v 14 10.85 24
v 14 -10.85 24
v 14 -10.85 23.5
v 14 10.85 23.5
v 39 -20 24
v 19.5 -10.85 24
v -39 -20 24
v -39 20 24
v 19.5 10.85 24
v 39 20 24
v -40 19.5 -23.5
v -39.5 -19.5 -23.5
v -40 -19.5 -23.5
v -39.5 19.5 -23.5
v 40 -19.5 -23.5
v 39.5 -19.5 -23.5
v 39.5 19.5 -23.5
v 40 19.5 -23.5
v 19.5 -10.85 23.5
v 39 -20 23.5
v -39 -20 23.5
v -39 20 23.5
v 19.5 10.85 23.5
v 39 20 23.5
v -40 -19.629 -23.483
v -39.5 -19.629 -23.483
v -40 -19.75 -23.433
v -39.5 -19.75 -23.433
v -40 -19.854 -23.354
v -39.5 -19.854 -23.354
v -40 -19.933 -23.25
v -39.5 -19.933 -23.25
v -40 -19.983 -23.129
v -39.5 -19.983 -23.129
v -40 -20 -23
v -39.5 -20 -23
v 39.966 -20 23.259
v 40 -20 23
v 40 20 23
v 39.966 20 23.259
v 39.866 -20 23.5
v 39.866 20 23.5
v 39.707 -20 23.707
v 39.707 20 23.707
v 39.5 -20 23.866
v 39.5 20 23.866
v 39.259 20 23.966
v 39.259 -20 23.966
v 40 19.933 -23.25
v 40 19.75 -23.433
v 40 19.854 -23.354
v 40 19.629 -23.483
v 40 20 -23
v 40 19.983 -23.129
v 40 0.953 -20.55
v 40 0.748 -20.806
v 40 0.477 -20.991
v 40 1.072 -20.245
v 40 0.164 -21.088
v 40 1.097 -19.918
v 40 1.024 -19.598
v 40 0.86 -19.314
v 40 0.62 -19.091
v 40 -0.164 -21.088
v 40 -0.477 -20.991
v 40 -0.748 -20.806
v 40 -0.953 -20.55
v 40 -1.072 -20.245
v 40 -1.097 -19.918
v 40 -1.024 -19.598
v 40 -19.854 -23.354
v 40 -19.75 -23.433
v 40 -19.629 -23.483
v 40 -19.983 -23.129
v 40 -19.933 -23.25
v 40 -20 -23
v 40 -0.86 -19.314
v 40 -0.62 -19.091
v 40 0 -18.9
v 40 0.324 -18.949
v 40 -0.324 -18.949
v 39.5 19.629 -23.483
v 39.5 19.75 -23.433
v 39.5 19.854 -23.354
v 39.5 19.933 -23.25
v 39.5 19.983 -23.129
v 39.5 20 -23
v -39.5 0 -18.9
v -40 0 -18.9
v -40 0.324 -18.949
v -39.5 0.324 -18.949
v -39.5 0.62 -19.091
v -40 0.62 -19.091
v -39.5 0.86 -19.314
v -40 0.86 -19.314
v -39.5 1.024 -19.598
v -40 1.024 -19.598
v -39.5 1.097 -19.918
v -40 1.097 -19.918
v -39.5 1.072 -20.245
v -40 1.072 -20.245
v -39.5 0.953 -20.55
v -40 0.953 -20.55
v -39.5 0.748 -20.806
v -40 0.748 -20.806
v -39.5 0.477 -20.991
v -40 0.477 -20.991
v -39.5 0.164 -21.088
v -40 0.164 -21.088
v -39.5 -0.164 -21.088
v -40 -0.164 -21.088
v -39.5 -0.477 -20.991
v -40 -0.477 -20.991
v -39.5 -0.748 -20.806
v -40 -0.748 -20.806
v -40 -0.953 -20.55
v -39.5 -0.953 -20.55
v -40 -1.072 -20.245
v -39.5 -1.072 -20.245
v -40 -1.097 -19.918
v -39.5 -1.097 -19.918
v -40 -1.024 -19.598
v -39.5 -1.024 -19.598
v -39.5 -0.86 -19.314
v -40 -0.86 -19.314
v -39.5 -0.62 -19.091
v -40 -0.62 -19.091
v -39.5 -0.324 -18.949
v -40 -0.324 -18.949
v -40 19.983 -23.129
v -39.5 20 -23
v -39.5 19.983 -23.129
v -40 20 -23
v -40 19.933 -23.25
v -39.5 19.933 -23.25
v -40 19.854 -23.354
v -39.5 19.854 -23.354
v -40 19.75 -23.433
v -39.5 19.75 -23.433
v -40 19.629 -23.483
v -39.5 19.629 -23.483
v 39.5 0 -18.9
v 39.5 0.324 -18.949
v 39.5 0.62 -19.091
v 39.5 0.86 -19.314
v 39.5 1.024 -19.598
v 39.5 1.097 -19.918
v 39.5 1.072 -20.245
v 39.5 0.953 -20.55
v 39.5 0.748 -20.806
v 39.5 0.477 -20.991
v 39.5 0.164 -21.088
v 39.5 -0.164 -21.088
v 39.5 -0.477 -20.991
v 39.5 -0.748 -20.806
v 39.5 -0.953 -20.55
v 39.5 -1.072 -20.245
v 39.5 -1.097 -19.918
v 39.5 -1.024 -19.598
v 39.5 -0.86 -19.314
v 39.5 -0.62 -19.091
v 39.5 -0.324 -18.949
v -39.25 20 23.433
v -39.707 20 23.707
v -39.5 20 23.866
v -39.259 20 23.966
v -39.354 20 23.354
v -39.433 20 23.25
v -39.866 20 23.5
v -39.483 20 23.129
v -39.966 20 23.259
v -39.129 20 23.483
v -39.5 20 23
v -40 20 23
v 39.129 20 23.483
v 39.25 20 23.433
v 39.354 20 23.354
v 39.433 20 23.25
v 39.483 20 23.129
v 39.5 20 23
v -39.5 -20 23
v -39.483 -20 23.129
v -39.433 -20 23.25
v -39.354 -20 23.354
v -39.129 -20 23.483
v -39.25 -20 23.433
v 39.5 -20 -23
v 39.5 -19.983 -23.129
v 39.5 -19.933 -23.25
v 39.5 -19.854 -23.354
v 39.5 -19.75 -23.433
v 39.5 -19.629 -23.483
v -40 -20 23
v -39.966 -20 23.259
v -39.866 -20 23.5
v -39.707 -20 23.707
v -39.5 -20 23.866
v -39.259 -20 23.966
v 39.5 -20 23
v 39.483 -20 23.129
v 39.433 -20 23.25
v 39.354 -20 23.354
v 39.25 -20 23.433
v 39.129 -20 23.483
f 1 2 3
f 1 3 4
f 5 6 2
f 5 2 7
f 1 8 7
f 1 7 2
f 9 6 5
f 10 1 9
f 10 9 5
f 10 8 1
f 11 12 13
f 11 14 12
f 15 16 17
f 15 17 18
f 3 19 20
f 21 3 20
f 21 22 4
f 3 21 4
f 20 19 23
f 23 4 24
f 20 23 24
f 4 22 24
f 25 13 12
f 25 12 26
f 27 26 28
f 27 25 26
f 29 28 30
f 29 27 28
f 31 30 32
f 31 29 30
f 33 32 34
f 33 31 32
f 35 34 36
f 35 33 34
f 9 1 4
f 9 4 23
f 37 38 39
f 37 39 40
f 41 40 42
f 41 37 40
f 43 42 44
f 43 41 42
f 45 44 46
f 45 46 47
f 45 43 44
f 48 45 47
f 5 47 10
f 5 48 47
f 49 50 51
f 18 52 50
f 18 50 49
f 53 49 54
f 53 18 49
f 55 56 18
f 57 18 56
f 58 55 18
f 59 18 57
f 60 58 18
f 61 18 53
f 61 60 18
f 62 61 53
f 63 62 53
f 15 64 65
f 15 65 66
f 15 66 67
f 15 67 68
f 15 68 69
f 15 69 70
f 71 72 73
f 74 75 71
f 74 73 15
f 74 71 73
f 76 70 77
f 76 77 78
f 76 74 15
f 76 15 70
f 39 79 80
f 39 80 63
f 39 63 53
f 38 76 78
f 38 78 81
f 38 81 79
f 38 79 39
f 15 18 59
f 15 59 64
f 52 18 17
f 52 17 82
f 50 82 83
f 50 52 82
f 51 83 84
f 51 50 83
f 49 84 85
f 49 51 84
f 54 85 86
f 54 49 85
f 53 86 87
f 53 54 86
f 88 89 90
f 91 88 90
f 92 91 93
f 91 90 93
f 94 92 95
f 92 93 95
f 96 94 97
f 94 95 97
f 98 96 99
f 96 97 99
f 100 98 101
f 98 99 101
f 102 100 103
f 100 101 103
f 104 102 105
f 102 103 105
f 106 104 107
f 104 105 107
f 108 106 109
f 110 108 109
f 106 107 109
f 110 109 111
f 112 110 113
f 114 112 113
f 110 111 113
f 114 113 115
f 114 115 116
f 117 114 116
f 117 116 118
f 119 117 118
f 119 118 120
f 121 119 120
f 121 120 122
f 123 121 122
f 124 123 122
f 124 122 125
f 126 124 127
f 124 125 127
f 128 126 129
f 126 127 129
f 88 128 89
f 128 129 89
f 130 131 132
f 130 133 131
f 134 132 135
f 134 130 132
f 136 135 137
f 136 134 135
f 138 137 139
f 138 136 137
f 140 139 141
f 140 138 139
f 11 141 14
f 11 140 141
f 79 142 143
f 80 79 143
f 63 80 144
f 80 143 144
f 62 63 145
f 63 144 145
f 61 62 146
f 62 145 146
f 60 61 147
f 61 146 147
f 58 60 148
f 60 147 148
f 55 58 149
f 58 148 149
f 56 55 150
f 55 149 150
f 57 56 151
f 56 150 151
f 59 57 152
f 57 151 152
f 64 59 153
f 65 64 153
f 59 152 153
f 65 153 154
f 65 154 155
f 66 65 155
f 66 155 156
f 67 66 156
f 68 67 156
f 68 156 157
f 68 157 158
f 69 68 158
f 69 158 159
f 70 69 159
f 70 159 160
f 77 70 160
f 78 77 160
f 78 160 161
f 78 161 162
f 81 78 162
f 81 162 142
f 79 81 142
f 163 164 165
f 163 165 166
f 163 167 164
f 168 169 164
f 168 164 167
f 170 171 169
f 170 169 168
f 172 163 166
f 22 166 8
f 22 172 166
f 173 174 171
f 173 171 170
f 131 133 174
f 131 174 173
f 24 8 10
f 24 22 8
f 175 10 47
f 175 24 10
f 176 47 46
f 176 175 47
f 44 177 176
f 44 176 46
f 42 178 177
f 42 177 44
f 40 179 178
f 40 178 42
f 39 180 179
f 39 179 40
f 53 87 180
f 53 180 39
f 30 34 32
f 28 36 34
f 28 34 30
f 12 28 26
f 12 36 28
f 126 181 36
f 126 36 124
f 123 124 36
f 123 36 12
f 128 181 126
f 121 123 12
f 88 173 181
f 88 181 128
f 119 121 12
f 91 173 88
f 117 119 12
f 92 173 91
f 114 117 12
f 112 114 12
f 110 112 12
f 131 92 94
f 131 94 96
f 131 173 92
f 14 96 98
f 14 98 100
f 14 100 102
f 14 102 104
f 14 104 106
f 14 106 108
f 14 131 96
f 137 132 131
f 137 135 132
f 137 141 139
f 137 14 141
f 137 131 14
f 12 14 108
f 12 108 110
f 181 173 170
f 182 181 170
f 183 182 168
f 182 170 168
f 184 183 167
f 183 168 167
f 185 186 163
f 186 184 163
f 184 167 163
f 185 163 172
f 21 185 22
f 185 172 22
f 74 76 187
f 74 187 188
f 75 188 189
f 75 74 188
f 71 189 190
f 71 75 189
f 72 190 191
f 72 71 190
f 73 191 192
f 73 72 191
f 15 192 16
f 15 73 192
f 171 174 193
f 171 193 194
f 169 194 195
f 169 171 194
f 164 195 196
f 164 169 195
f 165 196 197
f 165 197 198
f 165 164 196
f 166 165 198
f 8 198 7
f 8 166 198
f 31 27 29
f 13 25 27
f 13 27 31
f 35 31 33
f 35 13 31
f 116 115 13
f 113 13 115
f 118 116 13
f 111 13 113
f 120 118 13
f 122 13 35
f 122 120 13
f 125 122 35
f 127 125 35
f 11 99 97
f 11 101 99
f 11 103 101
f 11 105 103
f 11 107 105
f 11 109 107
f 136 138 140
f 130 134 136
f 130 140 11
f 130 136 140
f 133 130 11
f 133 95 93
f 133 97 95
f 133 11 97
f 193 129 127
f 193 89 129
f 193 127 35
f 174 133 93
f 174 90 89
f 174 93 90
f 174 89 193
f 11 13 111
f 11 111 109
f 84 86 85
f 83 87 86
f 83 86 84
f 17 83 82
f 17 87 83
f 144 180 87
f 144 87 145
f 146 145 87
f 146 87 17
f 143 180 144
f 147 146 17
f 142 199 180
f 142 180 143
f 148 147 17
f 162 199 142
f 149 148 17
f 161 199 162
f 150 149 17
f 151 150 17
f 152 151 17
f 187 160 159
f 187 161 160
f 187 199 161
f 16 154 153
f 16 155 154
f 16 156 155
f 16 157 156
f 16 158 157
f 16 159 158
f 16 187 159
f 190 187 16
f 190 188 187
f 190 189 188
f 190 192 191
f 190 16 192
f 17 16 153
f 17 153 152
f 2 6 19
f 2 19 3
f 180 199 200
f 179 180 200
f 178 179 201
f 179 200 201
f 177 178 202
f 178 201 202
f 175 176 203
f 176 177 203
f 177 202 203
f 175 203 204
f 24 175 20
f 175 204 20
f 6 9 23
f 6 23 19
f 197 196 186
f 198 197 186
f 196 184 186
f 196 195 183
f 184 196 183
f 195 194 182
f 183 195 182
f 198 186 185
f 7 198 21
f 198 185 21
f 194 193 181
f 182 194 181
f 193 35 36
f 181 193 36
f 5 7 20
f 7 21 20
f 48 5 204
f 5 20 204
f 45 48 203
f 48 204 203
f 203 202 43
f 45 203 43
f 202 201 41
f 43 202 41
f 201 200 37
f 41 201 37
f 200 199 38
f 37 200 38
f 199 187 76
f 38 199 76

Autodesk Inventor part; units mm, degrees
ref_plane "YZ Plane" through (0, 0, 0) normal (1, 0, 0) x (0, 1, 0)
ref_plane "XZ Plane" through (0, 0, 0) normal (0, 1, 0) x (-1, 0, 0)
ref_plane "РабПлоскость1" through (0, 0, 24) normal (0, 0, 1) x (1, 0, 0)
sketch "Эскиз1" plane through (0, 0, 24) normal (0, 0, 1) x (1, 0, 0)
  line L0 (-40, 20) -> (40, 20)
  line L1 (40, 20) -> (40, -20)
  line L2 (40, -20) -> (-40, -20)
  line L3 (-40, -20) -> (-40, 20)
  line L4 (-40, 20) -> (40, -20) construction
  line L5 (40, 20) -> (-40, -20) construction
  point P0 (0, 0)
  dimension "d1" = 80
  dimension "d2" = 40
extrude "Пластина1" add sketch "Эскиз1" against normal blind 0.5
sketch "Эскиз2" plane through (-39.5, 20, 24) normal (-1, 0, 0) x (0, -1, 0)
  line L0 (40, 0) -> (0, 0)
  line L1 (0, 0) -> (0, -47.5)
  line L2 (0, -47.5) -> (40, -47.5)
  line L3 (40, -47.5) -> (40, 0)
edge flange "Фланец1" height 47.5 angle 90 thickness 0.5 bend radius 0.5 thickness toward (-1, 0, 0) relief tear relief width 0.5 relief depth 0.25 corner gap 0.5 corner form 0 edges at (-40, 0, 23.5) (40, 0, 23.5) wall of the first edge with corners at (-39.5, -20, 24) (-39.5, 20, 24) (-39.5, 20, -23.5) (-39.5, -20, -23.5)
bend "Сгиб1"
corner "УглСтык1"
sketch "Эскиз3" plane through (0, 0, 24) normal (0, 0, 1) x (1, 0, 0)
  line L0 (19.5, -10.85) -> (14, -10.85)
  line L1 (14, -10.85) -> (14, 10.85)
  line L2 (14, 10.85) -> (19.5, 10.85)
  line L3 (19.5, 10.85) -> (19.5, -10.85)
  line L4 (19.5, -10.85) -> (14, 10.85) construction
  line L5 (14, -10.85) -> (19.5, 10.85) construction
  line L6 (14.5, -10.5) -> (18.5, -10.5) projected
  line L7 (14.5, -10.5) -> (14.5, -9) projected
  line L8 (18.5, -10.5) -> (18.5, -9) projected
  line L9 (18.5, -9) -> (14.5, -9) projected
  line L10 (14.5, 9) -> (18.5, 9) projected
  line L11 (14.5, 9) -> (14.5, 10.5) projected
  line L12 (14.5, 10.5) -> (18.5, 10.5) projected
  line L13 (18.5, 9) -> (18.5, 10.5) projected
  line L14 (13.98, 11.925) -> (17.88, 11.925) projected
  line L15 (18.38, 10.5) -> (18.38, 11.925) projected
  line L16 (17.88, -11.925) -> (13.98, -11.925) projected
  line L17 (18.38, -11.925) -> (18.38, -10.5) projected
  line L18 (19.5, 9) -> (19.5, -9) projected
  line L19 (19.5, -10.5) -> (19.5, -9) projected
  line L20 (19.5, -10.5) -> (18.5, -10.5) projected
  line L21 (19.5, 9) -> (18.5, 9) projected
  line L22 (34.5, -2.5) -> (34.5, 2.5)
  line L23 (34.5, 0) -> (19.5, 0)
  point P0 (0, 0)
  point P1 (16.75, 0)
  point P2 (14, 0)
  dimension "d14" = 5.5
  dimension "d15" = 21.7
  dimension "d19" = 15
fillet "УглСкругление1" radius 0.5 4 edges at (-39.75, 20, -23.5) (-39.75, -20, -23.5) (39.75, 20, -23.5) (39.75, -20, -23.5)
extrude "Вырез1" cut sketch "Эскиз3" against normal blind 0.5
sketch "Эскиз4" plane through (-40, -20, 23) normal (-1, 0, 0) x (0, 0, 1)
  circle A0 centre (-43, 20) radius 1.5 projected
  circle A1 centre (-43, 20) radius 1.1
  point P0 (-23, 20)
  dimension "d20" = 2.2
extrude "Вырез2" cut sketch "Эскиз4" against normal blind 80 contours A1
sketch "Эскиз5" plane through (0, 0, 24) normal (0, 0, 1) x (1, 0, 0)
  line L0 (19.5, 10.85) -> (19.5, -10.85) projected
  line L1 (19.5, -10.85) -> (14, -10.85) projected
  line L2 (14, -10.85) -> (14, 10.85) projected
  line L3 (14, 10.85) -> (19.5, 10.85) projected
  line L4 (39, -20) -> (39, 20) projected
  line L5 (-39, 20) -> (39, 20) projected
  line L6 (-39, 20) -> (-39, -20) projected
  line L7 (39, -20) -> (-39, -20) projected
  line L8 (-40, -20) -> (-40, 20) projected
  line L9 (-40, -20) -> (-39, -20) projected
  line L10 (-39, 20) -> (-40, 20) projected
  line L11 (39, -20) -> (40, -20) projected
  line L12 (40, 20) -> (40, -20) projected
  line L13 (40, 20) -> (39, 20) projected
  point P0 (0, 0)
sketch "Эскиз6" plane through (-40, -20, 23) normal (-1, 0, 0) x (0, 0, 1)
  circle A0 centre (-43, 20) radius 1.1 projected
  arc A1 (-46, 40) -> (-46.5, 39.5) centre (-46, 39.5) ccw projected
  line L0 (-46.5, 0.5) -> (-46.5, 39.5) projected
  arc A2 (-46.5, 0.5) -> (-46, 0) centre (-46, 0.5) ccw projected
  line L1 (0, 0) -> (-46, 0) projected
  line L2 (0, 0) -> (0, 40) projected
  line L3 (-46, 40) -> (0, 40) projected
  point P0 (-23, 20)
equation "\"d17\" = Толщина"
equation "\"d3\" = Толщина"
equation "\"d4\" = Ширина_просечки"
equation "\"d5\" = Глубина_просечки"
equation "\"d6\" = Мин_остаток"
equation "\"d7\" = Радиус_перехода"
equation "\"d10\" = Радиус_гибки"
equation "\"d11\" = Размер_просечки"
equation "\"d12\" = Размер_зазора"
equation "\"d13\" = Радиус_Якоби"
equation "\"Радиус_гибки\" = Толщина"
equation "\"Ширина_просечки\" = Толщина"
equation "\"Глубина_просечки\" = 0.5 * Толщина"
equation "\"Размер_просечки\" = 4 * Толщина"
equation "\"Мин_остаток\" = 2 * Толщина"
equation "\"Радиус_перехода\" = Радиус_гибки"
equation "\"Радиус_Якоби\" = Радиус_гибки"
equation "\"Размер_зазора\" = Толщина"
equation "\"Толщина\" = 0.5"
properties part number "metal_cap"
